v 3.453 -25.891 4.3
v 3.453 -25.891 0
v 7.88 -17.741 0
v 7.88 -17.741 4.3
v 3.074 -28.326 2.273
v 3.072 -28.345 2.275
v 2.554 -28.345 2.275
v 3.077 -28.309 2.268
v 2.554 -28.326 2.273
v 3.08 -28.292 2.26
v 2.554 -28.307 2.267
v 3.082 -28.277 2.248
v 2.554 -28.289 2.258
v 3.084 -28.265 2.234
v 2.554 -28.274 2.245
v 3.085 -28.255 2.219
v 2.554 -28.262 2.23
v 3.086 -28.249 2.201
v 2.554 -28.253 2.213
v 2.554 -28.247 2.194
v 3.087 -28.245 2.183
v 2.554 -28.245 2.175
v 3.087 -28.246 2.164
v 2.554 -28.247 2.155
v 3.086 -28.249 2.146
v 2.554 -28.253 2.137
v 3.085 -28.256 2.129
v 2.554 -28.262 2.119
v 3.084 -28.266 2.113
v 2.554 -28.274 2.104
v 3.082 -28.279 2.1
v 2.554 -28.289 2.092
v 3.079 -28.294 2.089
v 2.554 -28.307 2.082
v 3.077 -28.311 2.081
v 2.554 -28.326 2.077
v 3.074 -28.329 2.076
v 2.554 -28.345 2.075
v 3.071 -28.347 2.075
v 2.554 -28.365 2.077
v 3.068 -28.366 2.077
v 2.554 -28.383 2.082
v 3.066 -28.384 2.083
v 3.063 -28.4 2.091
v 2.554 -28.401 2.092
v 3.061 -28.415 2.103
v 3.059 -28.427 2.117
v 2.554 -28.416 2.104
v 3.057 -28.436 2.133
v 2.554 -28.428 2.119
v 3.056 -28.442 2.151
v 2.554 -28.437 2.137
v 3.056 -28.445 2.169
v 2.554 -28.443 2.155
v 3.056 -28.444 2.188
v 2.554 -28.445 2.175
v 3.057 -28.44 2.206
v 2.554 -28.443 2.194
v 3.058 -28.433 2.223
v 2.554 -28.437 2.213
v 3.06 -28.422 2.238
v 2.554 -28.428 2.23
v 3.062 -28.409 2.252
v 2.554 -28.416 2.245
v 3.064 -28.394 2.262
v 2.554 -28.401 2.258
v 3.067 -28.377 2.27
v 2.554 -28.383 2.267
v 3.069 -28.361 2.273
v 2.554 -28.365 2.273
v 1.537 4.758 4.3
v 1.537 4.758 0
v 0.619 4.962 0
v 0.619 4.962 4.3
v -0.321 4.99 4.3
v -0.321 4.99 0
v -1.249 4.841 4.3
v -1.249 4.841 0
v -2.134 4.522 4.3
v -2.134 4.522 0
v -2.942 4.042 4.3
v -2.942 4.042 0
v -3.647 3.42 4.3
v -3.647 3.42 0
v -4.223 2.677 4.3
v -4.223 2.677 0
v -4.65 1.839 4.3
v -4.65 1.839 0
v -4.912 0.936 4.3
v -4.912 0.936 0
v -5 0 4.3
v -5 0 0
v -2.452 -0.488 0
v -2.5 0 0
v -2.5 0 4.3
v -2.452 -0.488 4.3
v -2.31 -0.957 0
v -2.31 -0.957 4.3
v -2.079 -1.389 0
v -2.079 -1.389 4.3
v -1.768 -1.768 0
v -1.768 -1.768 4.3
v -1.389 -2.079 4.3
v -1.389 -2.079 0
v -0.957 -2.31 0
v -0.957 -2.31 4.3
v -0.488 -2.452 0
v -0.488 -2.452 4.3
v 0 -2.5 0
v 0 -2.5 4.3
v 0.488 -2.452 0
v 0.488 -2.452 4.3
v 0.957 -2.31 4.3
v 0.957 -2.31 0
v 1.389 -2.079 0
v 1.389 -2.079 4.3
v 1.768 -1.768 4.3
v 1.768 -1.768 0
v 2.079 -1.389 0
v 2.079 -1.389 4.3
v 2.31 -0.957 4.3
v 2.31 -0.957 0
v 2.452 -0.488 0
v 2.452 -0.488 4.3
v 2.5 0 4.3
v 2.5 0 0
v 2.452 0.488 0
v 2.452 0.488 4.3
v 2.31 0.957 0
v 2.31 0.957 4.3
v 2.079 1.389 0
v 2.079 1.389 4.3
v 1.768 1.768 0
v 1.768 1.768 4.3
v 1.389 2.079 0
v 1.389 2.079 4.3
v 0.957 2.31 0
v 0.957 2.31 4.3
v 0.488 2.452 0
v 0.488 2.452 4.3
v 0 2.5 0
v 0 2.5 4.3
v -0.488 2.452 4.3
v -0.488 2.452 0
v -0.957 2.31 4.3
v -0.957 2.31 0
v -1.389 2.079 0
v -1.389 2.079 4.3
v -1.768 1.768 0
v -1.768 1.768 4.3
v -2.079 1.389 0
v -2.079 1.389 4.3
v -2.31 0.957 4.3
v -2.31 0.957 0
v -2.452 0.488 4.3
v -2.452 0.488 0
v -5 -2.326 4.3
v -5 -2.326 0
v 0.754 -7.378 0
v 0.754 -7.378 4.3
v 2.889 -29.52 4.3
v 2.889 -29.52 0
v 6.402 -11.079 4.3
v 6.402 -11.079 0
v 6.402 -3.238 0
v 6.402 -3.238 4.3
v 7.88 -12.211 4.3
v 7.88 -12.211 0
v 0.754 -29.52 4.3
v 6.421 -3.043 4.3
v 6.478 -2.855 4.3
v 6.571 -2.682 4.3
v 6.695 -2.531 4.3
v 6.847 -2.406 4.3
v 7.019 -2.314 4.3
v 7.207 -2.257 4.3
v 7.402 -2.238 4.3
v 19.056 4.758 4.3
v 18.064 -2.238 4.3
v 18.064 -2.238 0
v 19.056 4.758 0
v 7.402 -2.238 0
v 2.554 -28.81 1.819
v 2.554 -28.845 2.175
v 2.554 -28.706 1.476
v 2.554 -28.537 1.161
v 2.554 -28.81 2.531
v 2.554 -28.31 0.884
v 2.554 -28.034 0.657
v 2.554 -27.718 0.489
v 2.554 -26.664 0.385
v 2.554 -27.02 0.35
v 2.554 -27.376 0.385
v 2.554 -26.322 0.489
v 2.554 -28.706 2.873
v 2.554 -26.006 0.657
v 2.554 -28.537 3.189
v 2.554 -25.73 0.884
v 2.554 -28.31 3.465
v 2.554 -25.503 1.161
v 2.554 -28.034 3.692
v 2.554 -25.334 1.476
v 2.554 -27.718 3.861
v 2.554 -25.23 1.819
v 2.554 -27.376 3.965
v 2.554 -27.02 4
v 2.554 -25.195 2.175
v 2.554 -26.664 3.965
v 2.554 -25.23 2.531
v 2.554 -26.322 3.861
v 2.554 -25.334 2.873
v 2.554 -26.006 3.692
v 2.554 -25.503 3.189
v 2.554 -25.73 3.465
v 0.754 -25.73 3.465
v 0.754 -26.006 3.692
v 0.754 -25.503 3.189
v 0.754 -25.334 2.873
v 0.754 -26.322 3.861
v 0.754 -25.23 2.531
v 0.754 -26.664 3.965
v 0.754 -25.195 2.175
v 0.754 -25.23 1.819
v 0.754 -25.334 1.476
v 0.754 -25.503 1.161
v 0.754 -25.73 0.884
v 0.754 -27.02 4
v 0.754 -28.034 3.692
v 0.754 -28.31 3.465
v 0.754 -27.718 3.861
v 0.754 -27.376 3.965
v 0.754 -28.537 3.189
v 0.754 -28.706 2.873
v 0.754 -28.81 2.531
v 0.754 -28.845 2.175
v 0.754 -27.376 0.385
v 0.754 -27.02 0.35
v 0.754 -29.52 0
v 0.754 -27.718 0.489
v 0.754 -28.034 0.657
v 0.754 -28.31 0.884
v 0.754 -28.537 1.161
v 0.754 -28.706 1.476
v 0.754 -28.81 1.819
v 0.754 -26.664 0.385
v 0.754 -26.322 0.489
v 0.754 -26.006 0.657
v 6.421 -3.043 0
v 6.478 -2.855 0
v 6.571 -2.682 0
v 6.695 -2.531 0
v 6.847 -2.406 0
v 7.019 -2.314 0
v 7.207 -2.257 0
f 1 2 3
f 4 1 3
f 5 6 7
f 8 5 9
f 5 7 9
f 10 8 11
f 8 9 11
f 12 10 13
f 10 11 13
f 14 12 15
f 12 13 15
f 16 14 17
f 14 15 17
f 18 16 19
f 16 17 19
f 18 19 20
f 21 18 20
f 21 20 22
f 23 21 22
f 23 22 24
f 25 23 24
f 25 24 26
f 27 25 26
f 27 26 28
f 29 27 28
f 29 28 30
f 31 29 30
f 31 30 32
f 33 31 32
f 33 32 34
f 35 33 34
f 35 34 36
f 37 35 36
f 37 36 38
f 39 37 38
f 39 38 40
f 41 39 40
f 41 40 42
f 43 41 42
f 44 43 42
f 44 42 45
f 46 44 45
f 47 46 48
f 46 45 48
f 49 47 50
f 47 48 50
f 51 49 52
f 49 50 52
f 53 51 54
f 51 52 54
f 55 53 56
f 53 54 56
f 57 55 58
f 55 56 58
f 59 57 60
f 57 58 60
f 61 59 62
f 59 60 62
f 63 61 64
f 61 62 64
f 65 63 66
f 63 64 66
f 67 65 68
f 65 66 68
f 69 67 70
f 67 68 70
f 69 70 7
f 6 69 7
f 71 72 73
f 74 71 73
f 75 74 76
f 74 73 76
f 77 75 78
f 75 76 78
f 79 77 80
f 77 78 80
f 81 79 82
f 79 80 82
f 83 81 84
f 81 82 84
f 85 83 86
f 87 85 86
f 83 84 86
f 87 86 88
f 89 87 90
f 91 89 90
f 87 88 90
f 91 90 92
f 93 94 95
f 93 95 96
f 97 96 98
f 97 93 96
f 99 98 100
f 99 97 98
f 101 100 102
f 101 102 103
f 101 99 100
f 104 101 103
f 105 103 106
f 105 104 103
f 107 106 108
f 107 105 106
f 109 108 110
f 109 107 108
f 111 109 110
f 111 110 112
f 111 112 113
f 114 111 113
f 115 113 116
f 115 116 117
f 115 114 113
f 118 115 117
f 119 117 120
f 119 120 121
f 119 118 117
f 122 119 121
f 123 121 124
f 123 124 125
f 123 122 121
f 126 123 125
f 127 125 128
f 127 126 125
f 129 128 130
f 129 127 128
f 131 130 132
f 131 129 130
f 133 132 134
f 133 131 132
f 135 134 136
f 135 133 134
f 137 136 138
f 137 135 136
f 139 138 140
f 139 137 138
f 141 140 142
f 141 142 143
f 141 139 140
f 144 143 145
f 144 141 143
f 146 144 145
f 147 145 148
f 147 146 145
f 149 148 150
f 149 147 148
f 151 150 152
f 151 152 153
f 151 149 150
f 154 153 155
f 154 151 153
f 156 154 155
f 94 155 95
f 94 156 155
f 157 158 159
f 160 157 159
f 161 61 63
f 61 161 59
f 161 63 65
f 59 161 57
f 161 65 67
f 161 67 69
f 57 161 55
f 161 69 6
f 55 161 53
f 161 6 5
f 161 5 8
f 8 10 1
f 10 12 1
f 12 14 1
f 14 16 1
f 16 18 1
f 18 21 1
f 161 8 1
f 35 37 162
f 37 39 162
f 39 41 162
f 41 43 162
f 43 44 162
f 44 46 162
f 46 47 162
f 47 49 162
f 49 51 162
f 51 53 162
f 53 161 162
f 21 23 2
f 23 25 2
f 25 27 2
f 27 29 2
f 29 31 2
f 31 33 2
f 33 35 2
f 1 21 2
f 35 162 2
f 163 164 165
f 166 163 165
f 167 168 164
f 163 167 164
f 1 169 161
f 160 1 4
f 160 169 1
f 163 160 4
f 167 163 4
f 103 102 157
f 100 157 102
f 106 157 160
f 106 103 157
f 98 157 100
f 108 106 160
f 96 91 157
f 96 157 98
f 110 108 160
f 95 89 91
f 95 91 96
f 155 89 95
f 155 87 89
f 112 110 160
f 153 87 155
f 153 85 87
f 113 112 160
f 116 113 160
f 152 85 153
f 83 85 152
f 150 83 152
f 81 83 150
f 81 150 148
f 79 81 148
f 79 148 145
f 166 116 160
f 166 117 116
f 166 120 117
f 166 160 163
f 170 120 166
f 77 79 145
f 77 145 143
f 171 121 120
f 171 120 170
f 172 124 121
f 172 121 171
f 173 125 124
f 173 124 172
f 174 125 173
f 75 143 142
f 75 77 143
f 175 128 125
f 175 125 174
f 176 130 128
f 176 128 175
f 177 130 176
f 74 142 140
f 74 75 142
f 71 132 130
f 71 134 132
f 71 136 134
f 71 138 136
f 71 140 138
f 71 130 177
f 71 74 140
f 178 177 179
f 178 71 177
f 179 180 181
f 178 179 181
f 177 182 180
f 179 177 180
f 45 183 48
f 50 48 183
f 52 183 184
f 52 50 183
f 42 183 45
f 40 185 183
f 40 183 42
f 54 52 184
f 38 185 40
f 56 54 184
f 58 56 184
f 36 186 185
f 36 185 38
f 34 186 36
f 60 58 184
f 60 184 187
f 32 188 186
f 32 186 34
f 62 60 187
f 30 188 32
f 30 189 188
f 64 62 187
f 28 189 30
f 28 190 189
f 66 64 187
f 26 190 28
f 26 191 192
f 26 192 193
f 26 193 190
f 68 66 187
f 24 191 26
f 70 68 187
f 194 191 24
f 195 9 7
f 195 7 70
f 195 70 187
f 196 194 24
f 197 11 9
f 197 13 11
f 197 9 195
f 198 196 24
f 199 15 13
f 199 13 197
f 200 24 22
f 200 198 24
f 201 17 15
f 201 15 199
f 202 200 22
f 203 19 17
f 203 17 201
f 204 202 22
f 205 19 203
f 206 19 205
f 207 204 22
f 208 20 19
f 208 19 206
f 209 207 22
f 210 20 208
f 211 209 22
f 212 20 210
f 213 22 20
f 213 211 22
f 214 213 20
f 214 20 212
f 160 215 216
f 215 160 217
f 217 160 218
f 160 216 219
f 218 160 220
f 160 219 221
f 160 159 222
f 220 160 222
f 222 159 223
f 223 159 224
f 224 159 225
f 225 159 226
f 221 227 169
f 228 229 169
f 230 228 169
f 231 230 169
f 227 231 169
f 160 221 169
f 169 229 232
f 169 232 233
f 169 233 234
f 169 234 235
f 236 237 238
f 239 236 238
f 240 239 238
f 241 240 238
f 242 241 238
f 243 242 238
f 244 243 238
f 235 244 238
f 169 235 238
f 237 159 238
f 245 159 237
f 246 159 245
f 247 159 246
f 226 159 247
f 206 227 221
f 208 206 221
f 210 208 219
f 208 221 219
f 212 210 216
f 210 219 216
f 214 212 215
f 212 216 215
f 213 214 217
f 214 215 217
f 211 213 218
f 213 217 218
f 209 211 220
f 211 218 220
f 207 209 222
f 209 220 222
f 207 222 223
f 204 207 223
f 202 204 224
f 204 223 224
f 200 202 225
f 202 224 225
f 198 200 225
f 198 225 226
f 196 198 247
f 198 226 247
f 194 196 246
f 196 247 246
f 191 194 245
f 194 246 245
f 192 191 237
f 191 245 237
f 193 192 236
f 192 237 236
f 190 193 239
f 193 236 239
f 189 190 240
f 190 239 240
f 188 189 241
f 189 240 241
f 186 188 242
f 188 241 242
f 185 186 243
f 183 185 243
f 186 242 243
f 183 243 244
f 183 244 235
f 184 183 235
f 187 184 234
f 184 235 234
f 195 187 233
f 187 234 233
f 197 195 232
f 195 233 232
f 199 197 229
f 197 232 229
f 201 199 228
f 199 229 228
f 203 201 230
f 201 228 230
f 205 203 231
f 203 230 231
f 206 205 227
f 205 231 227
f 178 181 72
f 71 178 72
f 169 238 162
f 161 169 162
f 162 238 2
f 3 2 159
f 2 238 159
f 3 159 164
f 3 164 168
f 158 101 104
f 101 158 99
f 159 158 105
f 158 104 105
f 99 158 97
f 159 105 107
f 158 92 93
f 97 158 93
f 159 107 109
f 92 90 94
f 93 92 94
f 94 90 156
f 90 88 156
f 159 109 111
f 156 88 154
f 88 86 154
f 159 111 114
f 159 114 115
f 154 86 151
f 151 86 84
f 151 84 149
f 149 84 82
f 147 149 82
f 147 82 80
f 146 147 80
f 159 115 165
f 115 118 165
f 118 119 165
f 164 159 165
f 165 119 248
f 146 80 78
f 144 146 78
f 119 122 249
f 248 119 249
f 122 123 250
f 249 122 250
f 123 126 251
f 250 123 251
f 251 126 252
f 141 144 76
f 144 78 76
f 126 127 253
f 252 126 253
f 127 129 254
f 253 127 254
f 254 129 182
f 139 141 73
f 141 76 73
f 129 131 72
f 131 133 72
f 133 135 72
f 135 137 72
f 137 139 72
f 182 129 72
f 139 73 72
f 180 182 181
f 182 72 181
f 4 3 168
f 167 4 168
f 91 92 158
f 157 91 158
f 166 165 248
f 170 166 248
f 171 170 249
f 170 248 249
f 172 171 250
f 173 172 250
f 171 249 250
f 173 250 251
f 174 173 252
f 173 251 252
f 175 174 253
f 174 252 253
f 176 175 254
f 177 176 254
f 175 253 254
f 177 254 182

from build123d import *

# Parameters (mm, degrees)
SKETCH_1_R          = 5
SKETCH_1_R_2        = 2.5
EXTRUDE_1_DEPTH     = 4.3
SKETCH_3_R          = 1.825
CUT_EXTRUDE_1_DEPTH = 1.8
CUT_EXTRUDE_2_REACH = 36.091
SKETCH_4_R          = 0.1


with BuildPart() as part:
    # 스케치1 → 보스-돌출1 (new body)
    # profile 1 of 2: a face of its own
    with BuildSketch(Plane.XY):
        with BuildLine():
            ThreePointArc((5, 0), (0, -5), (-5, 0))
            Line((-5, 0), (-5, -2.326474397))
            Line((-5, -2.326474397), (0.754164722, -7.377840375))
            Line((0.754164722, -7.377840375), (0.754164722, -29.519890116))
            Line((0.754164722, -29.519890116), (2.889052882, -29.519890116))
            Line((2.889052882, -29.519890116), (3.452626944, -25.890848407))
            Line((3.452626944, -25.890848407), (7.880357437, -17.740939791))
            Line((7.880357437, -17.740939791), (7.880357437, -12.211059606))
            Line((7.880357437, -12.211059606), (6.40208237, -11.079255258))
            Line((6.40208237, -11.079255258), (6.40208237, -3.237610212))
            ThreePointArc((6.40208237, -3.237610212), (6.694975589, -2.530503431), (7.40208237, -2.237610212))
            Line((7.40208237, -2.237610212), (18.063612226, -2.237610212))
            Line((18.063612226, -2.237610212), (19.056002599, 4.757997197))
            Line((19.056002599, 4.757997197), (1.536705134, 4.757997197))
            ThreePointArc((1.536705134, 4.757997197), (4.04249463, 2.942488261), (5, 0))
        make_face()
    # profile 2 of 2: a face of its own
    with BuildSketch(Plane.XY):
        Circle(SKETCH_1_R)
        with Locations(Location((0, 0, 0), (0, 0, 180))):
            Circle(SKETCH_1_R_2, mode=Mode.SUBTRACT)
    extrude(amount=EXTRUDE_1_DEPTH)

    # 스케치3 → 컷-돌출1 (cut)
    with BuildSketch(Plane.ZY.offset(-0.754164722)):
        with Locations((2.174780249, -27.020012931)):
            Circle(SKETCH_3_R)
    extrude(amount=-CUT_EXTRUDE_1_DEPTH, mode=Mode.SUBTRACT)

    # 컷-돌출2: up to this plane
    cut_extrude_2_end = Plane(origin=(7.297372122, -1.133249487, 4.3), z_dir=(-0.9881554576984991, 0.15345615471746255, 0))
    # 스케치4 → 컷-돌출2 (cut, up to the surface)
    with BuildSketch(Plane.ZY.offset(-2.554164722), mode=Mode.PRIVATE) as cut_extrude_2_sk1:
        with Locations((2.174780249, -28.345012931)):
            Circle(SKETCH_4_R)
    cut_extrude_2_tool1 = split(extrude(cut_extrude_2_sk1.sketch, amount=-CUT_EXTRUDE_2_REACH, mode=Mode.PRIVATE), bisect_by=cut_extrude_2_end, keep=Keep.BOTH, mode=Mode.PRIVATE)
    add(cut_extrude_2_tool1.solids().sort_by_distance((2.554165, -28.345013, 2.17478))[0], mode=Mode.SUBTRACT)


solid = part.part
